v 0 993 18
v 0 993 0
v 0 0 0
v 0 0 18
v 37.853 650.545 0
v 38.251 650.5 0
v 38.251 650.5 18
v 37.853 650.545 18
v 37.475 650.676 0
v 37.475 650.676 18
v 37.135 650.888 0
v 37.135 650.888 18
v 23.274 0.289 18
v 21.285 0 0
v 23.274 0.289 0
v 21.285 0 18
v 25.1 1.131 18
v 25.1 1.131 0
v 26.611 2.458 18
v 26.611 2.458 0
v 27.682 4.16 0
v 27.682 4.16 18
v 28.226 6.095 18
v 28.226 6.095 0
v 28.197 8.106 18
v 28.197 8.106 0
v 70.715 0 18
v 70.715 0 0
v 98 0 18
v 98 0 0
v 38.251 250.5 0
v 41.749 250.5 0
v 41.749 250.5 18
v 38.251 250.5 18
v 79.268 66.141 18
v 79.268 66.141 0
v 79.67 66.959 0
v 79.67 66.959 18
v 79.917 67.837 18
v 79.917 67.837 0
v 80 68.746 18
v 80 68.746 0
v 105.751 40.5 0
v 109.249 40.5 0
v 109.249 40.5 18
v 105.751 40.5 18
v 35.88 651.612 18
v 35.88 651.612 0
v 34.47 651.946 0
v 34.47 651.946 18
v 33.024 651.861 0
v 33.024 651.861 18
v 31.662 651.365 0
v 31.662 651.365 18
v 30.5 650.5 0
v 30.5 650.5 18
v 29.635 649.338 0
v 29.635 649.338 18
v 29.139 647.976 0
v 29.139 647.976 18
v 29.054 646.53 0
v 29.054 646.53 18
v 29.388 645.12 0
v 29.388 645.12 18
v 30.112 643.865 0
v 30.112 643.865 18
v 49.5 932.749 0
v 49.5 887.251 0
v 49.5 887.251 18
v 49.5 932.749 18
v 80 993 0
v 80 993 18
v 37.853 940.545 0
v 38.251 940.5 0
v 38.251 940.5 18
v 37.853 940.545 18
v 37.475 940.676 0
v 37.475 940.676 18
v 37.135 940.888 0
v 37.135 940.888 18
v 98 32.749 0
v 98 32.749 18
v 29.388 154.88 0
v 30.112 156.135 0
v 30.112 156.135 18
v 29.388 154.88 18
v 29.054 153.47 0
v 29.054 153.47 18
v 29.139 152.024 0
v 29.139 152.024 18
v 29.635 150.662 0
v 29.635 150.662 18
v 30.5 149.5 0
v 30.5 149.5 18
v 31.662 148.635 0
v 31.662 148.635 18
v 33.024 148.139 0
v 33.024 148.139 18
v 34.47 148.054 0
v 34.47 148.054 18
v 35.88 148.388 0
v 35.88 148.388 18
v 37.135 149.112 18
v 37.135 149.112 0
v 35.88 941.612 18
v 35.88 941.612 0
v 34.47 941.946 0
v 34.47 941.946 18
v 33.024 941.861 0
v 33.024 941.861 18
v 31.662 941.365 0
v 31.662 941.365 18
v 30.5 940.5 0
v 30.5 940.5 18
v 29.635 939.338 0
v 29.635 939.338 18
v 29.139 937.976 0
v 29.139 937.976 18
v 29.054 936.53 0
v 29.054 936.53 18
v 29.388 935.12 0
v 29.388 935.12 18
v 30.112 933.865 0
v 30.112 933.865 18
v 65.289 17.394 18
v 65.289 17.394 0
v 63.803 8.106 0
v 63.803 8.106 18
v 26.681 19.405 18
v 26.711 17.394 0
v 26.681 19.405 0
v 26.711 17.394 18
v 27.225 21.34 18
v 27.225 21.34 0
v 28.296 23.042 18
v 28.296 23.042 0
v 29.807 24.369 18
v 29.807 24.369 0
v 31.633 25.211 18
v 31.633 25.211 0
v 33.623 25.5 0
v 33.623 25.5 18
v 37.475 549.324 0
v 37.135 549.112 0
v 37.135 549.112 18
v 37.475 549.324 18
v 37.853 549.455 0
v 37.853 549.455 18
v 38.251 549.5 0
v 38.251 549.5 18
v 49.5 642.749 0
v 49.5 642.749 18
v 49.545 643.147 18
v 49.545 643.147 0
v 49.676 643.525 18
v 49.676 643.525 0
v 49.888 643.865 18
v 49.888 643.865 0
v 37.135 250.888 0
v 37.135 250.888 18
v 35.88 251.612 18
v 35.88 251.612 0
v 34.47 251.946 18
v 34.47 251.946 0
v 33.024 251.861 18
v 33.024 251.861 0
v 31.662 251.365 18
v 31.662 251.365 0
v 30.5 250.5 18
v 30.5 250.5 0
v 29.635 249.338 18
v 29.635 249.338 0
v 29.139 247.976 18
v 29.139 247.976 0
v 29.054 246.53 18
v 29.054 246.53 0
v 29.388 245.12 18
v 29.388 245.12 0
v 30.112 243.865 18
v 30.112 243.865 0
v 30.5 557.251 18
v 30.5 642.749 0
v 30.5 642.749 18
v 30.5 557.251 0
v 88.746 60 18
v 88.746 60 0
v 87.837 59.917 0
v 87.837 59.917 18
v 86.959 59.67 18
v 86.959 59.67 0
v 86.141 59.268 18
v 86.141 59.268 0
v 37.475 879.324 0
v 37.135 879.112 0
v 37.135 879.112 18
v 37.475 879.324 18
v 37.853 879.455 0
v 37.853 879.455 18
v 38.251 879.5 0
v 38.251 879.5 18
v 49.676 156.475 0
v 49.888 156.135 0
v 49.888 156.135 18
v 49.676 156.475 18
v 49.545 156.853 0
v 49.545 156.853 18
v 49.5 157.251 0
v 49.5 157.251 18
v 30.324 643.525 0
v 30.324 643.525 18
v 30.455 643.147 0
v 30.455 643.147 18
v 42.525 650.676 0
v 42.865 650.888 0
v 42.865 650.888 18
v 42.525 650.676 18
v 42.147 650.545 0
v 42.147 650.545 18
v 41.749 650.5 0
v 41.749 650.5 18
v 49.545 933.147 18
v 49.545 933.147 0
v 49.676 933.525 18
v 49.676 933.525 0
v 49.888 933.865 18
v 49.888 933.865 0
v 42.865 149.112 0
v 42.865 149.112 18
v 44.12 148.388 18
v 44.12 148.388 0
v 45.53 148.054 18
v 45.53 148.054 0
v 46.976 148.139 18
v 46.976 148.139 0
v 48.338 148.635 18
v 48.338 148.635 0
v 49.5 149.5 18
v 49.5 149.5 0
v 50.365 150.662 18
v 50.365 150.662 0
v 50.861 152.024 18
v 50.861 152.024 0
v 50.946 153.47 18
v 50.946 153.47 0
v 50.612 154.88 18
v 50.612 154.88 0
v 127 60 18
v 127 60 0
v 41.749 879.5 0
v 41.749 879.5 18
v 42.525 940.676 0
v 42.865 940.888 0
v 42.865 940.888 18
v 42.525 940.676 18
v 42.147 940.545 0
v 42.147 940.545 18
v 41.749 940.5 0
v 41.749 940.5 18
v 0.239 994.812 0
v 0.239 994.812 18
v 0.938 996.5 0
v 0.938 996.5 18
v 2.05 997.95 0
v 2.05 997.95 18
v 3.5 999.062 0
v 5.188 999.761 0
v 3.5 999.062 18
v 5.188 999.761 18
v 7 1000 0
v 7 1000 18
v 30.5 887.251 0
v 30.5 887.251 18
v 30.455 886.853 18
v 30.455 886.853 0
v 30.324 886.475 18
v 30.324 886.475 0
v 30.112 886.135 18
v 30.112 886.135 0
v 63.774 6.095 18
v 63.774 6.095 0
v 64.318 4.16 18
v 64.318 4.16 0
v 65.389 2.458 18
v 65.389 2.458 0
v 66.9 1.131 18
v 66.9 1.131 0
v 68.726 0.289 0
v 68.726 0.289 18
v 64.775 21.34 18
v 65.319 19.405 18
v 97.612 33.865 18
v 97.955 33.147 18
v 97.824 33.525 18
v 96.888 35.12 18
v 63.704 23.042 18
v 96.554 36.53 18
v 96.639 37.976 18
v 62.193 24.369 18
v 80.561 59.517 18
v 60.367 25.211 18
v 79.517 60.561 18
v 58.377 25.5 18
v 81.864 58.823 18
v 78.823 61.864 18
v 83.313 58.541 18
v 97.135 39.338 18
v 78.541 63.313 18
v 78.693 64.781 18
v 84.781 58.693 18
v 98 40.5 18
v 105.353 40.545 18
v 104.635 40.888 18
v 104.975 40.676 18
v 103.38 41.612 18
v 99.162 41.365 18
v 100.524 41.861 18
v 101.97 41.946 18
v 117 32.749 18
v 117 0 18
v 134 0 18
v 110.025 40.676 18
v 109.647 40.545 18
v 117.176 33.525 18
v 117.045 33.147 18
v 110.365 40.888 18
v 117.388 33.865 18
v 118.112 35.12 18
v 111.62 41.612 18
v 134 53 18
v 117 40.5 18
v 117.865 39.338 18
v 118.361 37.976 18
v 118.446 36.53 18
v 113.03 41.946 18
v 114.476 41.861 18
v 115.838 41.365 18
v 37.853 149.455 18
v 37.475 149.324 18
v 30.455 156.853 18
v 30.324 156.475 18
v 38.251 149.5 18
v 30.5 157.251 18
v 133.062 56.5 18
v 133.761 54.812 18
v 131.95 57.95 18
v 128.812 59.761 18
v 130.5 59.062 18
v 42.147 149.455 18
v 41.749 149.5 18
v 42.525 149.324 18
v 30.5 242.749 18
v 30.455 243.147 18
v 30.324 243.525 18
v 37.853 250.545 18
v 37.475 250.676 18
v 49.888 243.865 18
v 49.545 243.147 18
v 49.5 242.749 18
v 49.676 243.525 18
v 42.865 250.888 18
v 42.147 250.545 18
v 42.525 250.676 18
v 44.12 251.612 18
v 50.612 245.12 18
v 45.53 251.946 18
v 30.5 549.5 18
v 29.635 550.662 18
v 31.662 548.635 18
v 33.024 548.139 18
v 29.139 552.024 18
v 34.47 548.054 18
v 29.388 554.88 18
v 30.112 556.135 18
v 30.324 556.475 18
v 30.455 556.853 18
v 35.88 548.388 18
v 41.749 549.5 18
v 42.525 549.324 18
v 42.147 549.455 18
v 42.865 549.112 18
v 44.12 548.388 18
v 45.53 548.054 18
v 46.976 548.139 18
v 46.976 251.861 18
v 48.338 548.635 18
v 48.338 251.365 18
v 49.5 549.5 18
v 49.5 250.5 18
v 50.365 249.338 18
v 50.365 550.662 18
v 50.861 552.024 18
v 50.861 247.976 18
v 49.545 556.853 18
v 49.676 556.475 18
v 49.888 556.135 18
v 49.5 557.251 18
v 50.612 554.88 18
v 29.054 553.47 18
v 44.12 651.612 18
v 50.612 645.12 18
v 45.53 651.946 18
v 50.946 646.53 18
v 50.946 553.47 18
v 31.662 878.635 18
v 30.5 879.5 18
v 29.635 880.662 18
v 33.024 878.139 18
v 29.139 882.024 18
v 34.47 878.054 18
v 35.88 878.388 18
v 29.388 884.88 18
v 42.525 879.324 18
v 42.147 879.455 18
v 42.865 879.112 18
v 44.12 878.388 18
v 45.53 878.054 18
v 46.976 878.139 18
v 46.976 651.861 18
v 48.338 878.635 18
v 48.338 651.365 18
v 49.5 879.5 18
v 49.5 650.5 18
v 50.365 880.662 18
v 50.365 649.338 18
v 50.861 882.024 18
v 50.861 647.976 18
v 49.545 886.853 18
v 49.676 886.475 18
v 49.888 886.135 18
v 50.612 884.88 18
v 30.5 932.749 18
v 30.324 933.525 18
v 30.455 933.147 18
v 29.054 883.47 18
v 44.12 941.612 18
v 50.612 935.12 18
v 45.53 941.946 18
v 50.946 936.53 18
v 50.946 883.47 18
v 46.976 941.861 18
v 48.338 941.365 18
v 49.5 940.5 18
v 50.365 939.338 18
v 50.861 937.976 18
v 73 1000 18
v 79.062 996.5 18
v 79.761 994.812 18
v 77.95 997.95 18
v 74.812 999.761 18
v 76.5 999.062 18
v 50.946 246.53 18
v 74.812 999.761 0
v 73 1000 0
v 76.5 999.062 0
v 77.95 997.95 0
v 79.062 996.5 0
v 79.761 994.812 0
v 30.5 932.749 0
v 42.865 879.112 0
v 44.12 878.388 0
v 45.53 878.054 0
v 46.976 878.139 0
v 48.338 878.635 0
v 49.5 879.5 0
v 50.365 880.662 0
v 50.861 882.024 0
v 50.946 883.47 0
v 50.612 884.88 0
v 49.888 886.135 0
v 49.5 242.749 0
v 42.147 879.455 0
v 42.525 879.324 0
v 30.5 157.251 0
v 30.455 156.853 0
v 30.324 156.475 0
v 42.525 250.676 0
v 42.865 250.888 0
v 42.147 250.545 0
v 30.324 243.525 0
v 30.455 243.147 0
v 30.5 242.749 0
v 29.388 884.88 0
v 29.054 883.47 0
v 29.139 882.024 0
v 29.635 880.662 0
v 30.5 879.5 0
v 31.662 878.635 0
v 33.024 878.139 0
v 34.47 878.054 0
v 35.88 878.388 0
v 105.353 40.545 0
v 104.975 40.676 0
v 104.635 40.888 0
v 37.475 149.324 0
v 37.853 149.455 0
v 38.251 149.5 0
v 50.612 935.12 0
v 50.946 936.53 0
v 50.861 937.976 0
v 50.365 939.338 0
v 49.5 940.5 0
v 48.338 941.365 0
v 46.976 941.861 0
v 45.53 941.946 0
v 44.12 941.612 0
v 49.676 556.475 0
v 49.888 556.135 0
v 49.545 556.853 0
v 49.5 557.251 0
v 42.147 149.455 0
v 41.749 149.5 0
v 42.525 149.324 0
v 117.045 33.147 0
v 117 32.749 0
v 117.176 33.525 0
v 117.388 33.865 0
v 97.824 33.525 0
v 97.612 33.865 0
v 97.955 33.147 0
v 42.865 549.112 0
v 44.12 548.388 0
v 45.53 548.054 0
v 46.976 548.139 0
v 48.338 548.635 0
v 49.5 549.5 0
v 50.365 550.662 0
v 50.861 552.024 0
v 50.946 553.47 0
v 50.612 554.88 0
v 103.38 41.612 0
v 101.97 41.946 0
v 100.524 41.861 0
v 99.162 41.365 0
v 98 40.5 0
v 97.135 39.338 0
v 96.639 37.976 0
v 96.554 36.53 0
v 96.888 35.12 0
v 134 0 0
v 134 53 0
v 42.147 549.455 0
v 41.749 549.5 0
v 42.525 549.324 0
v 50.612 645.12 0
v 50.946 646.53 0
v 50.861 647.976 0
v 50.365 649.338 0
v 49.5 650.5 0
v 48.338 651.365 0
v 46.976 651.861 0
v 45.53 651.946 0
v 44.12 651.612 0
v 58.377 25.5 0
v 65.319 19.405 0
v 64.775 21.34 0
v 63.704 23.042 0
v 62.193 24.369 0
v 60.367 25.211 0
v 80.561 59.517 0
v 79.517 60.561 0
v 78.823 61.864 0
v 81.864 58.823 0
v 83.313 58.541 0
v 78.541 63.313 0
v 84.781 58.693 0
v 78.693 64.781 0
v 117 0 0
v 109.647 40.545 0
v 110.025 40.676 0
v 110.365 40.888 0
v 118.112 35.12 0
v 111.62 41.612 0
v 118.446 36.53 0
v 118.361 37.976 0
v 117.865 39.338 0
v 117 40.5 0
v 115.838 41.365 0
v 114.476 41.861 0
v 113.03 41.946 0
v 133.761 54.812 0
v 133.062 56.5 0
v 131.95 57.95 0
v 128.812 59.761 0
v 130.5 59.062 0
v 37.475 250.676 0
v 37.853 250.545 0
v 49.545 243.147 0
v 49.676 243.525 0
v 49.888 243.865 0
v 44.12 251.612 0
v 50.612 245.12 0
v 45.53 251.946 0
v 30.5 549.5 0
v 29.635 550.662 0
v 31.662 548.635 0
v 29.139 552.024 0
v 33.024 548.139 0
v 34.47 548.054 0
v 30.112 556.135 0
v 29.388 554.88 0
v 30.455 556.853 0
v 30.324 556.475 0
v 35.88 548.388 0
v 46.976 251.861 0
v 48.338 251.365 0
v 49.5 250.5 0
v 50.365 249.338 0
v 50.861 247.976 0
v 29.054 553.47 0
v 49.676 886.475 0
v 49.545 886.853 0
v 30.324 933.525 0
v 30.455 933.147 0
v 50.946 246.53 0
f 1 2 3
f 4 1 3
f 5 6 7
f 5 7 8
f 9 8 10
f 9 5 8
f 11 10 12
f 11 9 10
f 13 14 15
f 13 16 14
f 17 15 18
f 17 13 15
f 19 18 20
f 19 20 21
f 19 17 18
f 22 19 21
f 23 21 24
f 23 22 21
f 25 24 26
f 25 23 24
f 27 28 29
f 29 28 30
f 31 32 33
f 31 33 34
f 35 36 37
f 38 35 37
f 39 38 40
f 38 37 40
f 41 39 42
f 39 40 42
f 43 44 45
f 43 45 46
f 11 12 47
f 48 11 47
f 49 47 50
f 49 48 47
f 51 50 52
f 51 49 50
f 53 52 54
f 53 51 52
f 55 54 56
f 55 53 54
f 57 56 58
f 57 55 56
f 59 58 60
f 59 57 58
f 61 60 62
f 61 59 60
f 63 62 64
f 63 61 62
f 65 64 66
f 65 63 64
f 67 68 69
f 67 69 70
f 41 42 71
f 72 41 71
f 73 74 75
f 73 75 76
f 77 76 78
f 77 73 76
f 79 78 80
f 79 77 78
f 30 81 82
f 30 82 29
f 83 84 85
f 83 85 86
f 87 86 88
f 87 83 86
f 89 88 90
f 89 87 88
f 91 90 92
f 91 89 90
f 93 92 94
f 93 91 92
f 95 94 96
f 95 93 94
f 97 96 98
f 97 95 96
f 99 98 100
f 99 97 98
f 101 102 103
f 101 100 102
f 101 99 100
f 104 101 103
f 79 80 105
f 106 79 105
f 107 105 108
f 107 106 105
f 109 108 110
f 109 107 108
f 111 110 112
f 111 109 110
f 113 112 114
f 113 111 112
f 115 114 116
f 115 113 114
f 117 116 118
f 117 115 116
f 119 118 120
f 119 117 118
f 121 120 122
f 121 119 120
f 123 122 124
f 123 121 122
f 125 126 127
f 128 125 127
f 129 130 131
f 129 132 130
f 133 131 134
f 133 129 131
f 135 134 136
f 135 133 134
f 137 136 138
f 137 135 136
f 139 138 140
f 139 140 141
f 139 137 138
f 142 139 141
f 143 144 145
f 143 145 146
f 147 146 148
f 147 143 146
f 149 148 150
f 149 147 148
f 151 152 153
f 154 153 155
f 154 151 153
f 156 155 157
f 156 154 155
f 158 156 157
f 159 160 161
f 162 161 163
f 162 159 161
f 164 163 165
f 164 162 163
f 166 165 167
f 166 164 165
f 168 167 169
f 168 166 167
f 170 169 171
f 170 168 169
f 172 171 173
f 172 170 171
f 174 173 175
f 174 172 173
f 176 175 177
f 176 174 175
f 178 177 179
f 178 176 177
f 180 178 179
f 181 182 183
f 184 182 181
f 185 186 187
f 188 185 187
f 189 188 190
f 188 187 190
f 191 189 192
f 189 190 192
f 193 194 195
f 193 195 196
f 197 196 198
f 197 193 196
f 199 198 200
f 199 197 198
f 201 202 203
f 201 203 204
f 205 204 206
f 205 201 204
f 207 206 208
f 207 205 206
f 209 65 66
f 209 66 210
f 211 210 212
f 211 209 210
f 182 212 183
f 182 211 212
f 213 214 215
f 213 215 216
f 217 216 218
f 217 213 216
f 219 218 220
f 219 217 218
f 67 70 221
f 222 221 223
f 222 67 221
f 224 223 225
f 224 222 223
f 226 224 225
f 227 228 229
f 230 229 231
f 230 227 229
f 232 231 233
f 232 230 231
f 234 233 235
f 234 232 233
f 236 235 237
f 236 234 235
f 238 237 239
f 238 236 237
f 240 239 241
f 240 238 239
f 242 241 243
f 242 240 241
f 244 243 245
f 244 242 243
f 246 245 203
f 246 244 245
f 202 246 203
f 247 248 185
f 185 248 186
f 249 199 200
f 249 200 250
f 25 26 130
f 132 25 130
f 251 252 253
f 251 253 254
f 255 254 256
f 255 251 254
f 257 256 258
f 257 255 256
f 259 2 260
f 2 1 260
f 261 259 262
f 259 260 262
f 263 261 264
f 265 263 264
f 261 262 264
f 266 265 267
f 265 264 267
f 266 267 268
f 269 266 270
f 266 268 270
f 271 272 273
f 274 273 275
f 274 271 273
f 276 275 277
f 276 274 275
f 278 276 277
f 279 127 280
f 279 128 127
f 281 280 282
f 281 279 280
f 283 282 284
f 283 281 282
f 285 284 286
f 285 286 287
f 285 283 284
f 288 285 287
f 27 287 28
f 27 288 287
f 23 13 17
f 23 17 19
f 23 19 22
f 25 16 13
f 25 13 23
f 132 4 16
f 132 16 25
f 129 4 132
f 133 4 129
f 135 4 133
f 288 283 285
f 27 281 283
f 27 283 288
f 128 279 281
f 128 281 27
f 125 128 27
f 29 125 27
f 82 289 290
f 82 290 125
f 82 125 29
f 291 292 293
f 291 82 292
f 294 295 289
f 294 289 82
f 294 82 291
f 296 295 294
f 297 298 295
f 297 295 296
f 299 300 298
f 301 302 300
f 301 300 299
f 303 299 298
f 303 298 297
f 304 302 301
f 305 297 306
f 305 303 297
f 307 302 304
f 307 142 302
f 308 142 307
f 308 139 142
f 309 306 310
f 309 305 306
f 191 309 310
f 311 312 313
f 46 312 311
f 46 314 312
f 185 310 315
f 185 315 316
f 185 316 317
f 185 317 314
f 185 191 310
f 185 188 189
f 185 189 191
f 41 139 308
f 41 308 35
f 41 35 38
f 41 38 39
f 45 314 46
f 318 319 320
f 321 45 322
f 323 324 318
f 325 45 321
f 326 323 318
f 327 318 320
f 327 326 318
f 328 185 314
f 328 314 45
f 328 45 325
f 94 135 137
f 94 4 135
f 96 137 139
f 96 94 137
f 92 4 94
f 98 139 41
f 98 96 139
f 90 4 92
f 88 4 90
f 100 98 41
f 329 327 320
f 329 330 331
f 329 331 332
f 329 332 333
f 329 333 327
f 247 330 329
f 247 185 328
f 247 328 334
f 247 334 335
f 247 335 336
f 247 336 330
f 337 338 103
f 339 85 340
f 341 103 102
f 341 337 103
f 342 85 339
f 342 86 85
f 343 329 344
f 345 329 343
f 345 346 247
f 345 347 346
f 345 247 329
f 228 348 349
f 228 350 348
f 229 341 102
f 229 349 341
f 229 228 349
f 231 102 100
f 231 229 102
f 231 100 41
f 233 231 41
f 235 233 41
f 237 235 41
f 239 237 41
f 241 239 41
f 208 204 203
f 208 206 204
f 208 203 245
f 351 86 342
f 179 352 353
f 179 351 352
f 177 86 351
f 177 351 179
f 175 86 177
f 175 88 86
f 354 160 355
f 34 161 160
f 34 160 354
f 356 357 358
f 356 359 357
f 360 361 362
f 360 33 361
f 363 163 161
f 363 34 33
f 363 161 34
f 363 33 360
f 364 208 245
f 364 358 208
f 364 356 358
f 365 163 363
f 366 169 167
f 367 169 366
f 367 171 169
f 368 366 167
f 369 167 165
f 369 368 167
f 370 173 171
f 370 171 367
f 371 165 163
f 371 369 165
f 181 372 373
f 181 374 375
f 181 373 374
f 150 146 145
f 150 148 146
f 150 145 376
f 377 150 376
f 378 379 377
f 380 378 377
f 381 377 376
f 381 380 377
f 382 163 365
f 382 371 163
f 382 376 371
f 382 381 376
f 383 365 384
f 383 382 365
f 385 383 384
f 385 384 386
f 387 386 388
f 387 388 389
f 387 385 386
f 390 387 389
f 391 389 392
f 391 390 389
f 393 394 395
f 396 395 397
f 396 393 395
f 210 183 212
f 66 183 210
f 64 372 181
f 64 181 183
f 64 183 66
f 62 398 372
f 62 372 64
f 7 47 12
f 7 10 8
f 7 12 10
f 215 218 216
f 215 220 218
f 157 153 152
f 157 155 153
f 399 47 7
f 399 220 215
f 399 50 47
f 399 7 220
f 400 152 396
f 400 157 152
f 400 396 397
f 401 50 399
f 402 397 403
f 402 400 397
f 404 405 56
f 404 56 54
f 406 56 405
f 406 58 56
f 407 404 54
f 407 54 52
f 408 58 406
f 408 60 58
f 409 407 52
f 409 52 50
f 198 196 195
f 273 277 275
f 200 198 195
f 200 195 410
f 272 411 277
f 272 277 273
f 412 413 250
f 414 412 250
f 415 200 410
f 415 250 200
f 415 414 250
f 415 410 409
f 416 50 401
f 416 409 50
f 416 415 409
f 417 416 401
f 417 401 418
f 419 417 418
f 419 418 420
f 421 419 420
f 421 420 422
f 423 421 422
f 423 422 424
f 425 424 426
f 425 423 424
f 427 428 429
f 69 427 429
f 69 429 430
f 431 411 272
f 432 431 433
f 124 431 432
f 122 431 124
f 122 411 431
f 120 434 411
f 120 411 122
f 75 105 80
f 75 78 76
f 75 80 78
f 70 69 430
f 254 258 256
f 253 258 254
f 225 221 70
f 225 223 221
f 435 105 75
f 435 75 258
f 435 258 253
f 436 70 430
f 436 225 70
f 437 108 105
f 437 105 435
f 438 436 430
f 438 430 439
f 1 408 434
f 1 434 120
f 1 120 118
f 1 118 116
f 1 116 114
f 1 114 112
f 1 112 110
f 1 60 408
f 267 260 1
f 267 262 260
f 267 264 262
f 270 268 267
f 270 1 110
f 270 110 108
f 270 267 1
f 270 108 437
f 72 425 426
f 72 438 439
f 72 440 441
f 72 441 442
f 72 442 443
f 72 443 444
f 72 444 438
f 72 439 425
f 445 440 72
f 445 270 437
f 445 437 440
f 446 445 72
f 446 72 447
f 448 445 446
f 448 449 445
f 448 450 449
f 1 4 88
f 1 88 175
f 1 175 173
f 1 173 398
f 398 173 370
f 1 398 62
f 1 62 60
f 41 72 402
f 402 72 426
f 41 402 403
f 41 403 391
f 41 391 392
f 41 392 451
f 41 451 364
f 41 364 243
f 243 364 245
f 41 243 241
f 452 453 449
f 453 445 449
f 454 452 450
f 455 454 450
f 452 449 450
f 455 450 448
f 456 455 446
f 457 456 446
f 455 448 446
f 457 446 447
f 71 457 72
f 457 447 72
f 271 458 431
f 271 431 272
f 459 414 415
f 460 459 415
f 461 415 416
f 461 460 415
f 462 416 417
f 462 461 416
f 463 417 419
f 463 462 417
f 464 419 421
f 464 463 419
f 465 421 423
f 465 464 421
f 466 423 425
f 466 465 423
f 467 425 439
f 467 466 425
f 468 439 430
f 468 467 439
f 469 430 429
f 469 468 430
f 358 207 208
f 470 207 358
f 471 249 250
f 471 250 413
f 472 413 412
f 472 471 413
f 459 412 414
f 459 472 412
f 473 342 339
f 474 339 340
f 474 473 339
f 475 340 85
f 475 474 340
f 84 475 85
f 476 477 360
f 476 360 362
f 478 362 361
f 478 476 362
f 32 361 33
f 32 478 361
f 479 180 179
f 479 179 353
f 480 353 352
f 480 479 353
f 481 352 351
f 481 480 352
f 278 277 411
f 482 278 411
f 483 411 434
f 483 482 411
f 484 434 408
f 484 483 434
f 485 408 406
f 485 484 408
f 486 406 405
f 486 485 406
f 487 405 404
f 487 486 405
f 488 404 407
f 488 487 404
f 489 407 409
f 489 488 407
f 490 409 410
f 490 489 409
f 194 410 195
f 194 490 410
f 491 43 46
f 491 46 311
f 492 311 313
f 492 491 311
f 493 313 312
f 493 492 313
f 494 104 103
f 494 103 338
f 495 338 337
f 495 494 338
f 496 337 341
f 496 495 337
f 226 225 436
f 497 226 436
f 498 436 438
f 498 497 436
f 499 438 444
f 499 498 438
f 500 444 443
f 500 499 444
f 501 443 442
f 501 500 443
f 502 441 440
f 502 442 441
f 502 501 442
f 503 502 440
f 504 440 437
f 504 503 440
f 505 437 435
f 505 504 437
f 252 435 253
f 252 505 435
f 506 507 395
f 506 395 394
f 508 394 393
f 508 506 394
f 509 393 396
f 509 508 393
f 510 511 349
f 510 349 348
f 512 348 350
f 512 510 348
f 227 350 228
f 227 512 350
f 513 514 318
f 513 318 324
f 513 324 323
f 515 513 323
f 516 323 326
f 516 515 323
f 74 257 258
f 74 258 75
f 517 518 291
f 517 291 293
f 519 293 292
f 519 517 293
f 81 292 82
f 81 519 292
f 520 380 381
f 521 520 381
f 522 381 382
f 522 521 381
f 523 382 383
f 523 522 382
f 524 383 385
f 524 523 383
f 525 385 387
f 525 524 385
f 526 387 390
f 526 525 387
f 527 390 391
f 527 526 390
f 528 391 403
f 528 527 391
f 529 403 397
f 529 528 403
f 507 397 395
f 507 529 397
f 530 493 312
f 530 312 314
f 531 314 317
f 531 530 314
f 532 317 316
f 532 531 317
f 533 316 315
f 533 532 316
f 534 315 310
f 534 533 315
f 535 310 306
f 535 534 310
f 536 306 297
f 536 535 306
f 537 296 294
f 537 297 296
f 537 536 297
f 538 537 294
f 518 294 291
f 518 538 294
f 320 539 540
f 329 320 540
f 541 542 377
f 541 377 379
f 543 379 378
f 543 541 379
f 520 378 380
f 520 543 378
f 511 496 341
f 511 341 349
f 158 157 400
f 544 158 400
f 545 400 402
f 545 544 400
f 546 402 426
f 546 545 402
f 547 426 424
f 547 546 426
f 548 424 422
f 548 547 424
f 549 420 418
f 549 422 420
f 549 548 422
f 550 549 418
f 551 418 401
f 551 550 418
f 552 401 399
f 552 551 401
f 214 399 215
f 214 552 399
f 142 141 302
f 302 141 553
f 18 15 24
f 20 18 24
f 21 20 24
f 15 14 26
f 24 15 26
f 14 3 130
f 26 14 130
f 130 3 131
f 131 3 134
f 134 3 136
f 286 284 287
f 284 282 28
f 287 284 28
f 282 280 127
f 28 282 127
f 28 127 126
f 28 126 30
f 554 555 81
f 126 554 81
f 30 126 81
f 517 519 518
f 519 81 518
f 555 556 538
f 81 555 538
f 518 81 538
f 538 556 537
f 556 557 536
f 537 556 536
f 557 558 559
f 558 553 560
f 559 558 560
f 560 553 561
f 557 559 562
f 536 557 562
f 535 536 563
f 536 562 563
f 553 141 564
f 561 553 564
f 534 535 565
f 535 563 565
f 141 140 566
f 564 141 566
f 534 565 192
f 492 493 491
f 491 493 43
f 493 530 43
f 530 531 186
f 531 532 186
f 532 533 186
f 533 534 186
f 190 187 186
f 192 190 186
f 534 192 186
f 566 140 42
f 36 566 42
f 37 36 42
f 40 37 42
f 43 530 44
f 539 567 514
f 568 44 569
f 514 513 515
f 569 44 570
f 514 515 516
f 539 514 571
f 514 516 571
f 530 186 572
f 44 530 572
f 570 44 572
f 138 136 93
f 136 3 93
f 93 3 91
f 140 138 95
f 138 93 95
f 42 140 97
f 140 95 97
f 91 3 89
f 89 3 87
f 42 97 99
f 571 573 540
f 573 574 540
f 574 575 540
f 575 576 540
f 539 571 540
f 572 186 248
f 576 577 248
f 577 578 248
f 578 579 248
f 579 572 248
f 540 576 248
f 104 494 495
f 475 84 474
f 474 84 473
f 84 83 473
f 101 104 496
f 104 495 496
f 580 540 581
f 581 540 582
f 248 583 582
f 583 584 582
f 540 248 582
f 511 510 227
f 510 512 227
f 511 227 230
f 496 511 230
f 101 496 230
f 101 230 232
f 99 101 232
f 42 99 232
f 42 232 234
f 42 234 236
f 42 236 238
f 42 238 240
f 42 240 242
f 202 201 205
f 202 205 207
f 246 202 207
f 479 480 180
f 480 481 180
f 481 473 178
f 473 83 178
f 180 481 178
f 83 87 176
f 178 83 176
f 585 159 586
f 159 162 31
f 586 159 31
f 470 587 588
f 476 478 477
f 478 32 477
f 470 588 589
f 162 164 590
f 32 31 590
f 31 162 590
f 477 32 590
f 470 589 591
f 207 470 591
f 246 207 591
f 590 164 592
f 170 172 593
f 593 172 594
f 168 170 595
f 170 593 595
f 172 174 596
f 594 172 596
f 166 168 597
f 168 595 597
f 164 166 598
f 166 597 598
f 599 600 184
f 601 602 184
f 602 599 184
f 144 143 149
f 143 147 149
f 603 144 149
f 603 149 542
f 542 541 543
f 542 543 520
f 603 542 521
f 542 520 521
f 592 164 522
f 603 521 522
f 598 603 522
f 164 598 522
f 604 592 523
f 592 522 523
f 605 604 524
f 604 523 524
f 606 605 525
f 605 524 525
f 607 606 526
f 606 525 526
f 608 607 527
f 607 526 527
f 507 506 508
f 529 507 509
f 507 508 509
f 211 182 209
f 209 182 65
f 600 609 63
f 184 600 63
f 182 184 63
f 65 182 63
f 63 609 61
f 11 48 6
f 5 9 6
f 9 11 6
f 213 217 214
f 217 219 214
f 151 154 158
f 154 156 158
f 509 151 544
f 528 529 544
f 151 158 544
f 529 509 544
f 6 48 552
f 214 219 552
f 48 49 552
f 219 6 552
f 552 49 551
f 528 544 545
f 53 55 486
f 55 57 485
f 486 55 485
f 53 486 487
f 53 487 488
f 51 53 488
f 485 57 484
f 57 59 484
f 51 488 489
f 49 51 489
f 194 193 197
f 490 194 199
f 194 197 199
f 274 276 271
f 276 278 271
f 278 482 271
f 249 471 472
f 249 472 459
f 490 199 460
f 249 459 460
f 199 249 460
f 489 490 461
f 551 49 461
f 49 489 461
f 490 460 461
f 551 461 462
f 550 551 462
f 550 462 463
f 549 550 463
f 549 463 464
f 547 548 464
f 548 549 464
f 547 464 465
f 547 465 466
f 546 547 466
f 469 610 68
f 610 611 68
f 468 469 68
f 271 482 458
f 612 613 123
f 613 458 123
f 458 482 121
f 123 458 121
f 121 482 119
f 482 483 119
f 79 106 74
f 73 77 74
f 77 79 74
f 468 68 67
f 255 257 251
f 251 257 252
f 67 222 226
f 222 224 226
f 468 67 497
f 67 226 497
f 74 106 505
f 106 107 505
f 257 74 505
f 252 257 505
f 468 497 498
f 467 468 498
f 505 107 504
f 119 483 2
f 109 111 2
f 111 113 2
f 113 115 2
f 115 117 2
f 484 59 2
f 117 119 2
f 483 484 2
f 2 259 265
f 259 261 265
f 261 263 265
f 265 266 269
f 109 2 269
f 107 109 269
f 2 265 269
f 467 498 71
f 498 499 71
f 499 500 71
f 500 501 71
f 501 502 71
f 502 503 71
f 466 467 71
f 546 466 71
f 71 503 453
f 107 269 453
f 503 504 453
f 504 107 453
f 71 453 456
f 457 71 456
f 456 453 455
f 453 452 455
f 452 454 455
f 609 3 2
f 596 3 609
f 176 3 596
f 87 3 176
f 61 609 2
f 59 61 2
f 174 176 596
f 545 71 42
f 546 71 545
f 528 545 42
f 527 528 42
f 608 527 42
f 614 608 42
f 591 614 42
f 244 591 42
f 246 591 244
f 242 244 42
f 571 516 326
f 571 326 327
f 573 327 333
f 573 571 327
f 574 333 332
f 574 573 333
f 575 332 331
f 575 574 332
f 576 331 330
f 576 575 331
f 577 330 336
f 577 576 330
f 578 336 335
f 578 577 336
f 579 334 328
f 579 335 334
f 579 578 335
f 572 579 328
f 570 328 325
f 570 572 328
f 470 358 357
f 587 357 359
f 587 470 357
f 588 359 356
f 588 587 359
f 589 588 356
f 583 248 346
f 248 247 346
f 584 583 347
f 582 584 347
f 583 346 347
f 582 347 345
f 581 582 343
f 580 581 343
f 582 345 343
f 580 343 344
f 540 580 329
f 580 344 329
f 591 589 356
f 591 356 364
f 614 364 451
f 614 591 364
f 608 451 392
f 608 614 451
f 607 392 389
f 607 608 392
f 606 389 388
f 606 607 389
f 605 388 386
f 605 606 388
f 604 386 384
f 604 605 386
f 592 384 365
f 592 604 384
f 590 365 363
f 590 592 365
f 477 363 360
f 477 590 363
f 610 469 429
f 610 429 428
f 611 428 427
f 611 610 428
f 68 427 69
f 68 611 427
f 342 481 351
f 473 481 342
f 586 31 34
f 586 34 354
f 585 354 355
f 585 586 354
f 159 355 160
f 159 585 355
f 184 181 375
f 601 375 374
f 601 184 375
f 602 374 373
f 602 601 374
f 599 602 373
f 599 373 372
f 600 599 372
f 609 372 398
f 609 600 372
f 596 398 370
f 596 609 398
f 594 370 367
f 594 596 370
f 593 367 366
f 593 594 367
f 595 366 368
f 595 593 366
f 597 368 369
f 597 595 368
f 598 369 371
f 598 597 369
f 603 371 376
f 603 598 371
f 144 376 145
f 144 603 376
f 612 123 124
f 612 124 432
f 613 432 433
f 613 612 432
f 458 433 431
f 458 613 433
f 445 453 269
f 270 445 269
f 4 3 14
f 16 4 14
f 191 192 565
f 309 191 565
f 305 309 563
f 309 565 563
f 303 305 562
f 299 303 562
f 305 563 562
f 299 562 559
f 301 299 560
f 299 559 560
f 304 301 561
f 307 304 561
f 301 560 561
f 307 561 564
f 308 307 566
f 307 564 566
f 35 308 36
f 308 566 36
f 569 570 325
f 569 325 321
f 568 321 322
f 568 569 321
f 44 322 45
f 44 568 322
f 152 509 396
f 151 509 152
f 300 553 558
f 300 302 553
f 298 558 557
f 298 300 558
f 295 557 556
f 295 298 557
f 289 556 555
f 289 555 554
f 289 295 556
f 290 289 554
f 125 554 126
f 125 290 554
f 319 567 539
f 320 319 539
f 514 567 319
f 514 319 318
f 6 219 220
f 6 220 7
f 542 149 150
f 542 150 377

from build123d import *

# Parameters (mm, degrees)
BOSS_EXTRUDE1_DEPTH = 18
CUT_EXTRUDE1_DEPTH  = 19
CUT_EXTRUDE2_DEPTH  = 19
CUT_EXTRUDE3_DEPTH  = 19
LPATTERN1_COUNT     = 2
LPATTERN1_PITCH     = 400
FILLET1_R           = 7


with BuildPart() as part:
    # Sketch1 → Boss-Extrude1 (new body)
    with BuildSketch(Plane.XY):
        with BuildLine():
            Line((0, 0), (29.493640444, 0))
            Line((29.493640444, 0), (25.413640444, 25.5))
            Line((25.413640444, 25.5), (66.586359556, 25.5))
            Line((66.586359556, 25.5), (62.506359556, 0))
            Line((62.506359556, 0), (134, 0))
            Line((134, 0), (134, 60))
            Line((134, 60), (88.745587739, 60))
            ThreePointArc((88.745587739, 60), (87.392597488, 59.813462099), (86.140560822, 59.267766953))
            ThreePointArc((86.140560822, 59.267766953), (80, 60), (79.267766953, 66.140560822))
            ThreePointArc((79.267766953, 66.140560822), (79.813462099, 67.392597488), (80, 68.745587739))
            Line((80, 68.745587739), (80, 1000))
            Line((80, 1000), (0, 1000))
            Line((0, 1000), (0, 0))
        make_face()
    extrude(amount=BOSS_EXTRUDE1_DEPTH)

    # Sketch2 → Cut-Extrude1 (cut, through all)
    with BuildSketch(Plane.XY):
        with BuildLine():
            Line((30.5, 642.748771852), (30.5, 557.251228148))
            ThreePointArc((30.5, 557.251228148), (30.400327171, 556.660561143), (30.11234721, 556.135309084))
            ThreePointArc((30.11234721, 556.135309084), (30.5, 549.5), (37.135309084, 549.11234721))
            ThreePointArc((37.135309084, 549.11234721), (37.660561143, 549.400327171), (38.251228148, 549.5))
            Line((38.251228148, 549.5), (41.748771852, 549.5))
            ThreePointArc((41.748771852, 549.5), (42.339438857, 549.400327171), (42.864690916, 549.11234721))
            ThreePointArc((42.864690916, 549.11234721), (49.5, 549.5), (49.88765279, 556.135309084))
            ThreePointArc((49.88765279, 556.135309084), (49.599672829, 556.660561143), (49.5, 557.251228148))
            Line((49.5, 557.251228148), (49.5, 642.748771852))
            ThreePointArc((49.5, 642.748771852), (49.599672829, 643.339438857), (49.88765279, 643.864690916))
            ThreePointArc((49.88765279, 643.864690916), (49.5, 650.5), (42.864690916, 650.88765279))
            ThreePointArc((42.864690916, 650.88765279), (42.339438857, 650.599672829), (41.748771852, 650.5))
            Line((41.748771852, 650.5), (38.251228148, 650.5))
            ThreePointArc((38.251228148, 650.5), (37.660561143, 650.599672829), (37.135309084, 650.88765279))
            ThreePointArc((37.135309084, 650.88765279), (30.5, 650.5), (30.11234721, 643.864690916))
            ThreePointArc((30.11234721, 643.864690916), (30.400327171, 643.339438857), (30.5, 642.748771852))
        make_face()
    cut_extrude1 = extrude(amount=CUT_EXTRUDE1_DEPTH, mode=Mode.SUBTRACT)

    # Sketch3 → Cut-Extrude2 (cut, through all)
    with BuildSketch(Plane.XY):
        with BuildLine():
            Line((98, 0), (117, 0))
            Line((117, 0), (117, 32.748771852))
            ThreePointArc((117, 32.748771852), (117.099672829, 33.339438857), (117.38765279, 33.864690916))
            ThreePointArc((117.38765279, 33.864690916), (117, 40.5), (110.364690916, 40.88765279))
            ThreePointArc((110.364690916, 40.88765279), (109.839438857, 40.599672829), (109.248771852, 40.5))
            Line((109.248771852, 40.5), (105.751228148, 40.5))
            ThreePointArc((105.751228148, 40.5), (105.160561143, 40.599672829), (104.635309084, 40.88765279))
            ThreePointArc((104.635309084, 40.88765279), (98, 40.5), (97.61234721, 33.864690916))
            ThreePointArc((97.61234721, 33.864690916), (97.900327171, 33.339438857), (98, 32.748771852))
            Line((98, 32.748771852), (98, 0))
        make_face()
    extrude(amount=CUT_EXTRUDE2_DEPTH, mode=Mode.SUBTRACT)

    # Sketch4 → Cut-Extrude3 (cut, through all)
    with BuildSketch(Plane.XY):
        with BuildLine():
            Line((30.5, 932.748771852), (30.5, 887.251228148))
            ThreePointArc((30.5, 887.251228148), (30.400327171, 886.660561143), (30.11234721, 886.135309084))
            ThreePointArc((30.11234721, 886.135309084), (30.5, 879.5), (37.135309084, 879.11234721))
            ThreePointArc((37.135309084, 879.11234721), (37.660561143, 879.400327171), (38.251228148, 879.5))
            Line((38.251228148, 879.5), (41.748771852, 879.5))
            ThreePointArc((41.748771852, 879.5), (42.339438857, 879.400327171), (42.864690916, 879.11234721))
            ThreePointArc((42.864690916, 879.11234721), (49.5, 879.5), (49.88765279, 886.135309084))
            ThreePointArc((49.88765279, 886.135309084), (49.599672829, 886.660561143), (49.5, 887.251228148))
            Line((49.5, 887.251228148), (49.5, 932.748771852))
            ThreePointArc((49.5, 932.748771852), (49.599672829, 933.339438857), (49.88765279, 933.864690916))
            ThreePointArc((49.88765279, 933.864690916), (49.5, 940.5), (42.864690916, 940.88765279))
            ThreePointArc((42.864690916, 940.88765279), (42.339438857, 940.599672829), (41.748771852, 940.5))
            Line((41.748771852, 940.5), (38.251228148, 940.5))
            ThreePointArc((38.251228148, 940.5), (37.660561143, 940.599672829), (37.135309084, 940.88765279))
            ThreePointArc((37.135309084, 940.88765279), (30.5, 940.5), (30.11234721, 933.864690916))
            ThreePointArc((30.11234721, 933.864690916), (30.400327171, 933.339438857), (30.5, 932.748771852))
        make_face()
    extrude(amount=CUT_EXTRUDE3_DEPTH, mode=Mode.SUBTRACT)

    # LPattern1: Cut-Extrude1 ×2
    with Locations(*[(0, -i * LPATTERN1_PITCH, 0) for i in range(1, LPATTERN1_COUNT)]):
        add(cut_extrude1, mode=Mode.SUBTRACT)

    # Fillet1
    fillet1_edges = [part.edges().sort_by_distance(p)[0] for p in [
        (29.493640444, 0, 9),
        (25.413640444, 25.5, 9),
        (66.586359556, 25.5, 9),
        (62.506359556, 0, 9),
        (134, 60, 9),
        (80, 1000, 9),
        (0, 1000, 9),
    ]]
    fillet(fillet1_edges, radius=FILLET1_R)


solid = part.part
